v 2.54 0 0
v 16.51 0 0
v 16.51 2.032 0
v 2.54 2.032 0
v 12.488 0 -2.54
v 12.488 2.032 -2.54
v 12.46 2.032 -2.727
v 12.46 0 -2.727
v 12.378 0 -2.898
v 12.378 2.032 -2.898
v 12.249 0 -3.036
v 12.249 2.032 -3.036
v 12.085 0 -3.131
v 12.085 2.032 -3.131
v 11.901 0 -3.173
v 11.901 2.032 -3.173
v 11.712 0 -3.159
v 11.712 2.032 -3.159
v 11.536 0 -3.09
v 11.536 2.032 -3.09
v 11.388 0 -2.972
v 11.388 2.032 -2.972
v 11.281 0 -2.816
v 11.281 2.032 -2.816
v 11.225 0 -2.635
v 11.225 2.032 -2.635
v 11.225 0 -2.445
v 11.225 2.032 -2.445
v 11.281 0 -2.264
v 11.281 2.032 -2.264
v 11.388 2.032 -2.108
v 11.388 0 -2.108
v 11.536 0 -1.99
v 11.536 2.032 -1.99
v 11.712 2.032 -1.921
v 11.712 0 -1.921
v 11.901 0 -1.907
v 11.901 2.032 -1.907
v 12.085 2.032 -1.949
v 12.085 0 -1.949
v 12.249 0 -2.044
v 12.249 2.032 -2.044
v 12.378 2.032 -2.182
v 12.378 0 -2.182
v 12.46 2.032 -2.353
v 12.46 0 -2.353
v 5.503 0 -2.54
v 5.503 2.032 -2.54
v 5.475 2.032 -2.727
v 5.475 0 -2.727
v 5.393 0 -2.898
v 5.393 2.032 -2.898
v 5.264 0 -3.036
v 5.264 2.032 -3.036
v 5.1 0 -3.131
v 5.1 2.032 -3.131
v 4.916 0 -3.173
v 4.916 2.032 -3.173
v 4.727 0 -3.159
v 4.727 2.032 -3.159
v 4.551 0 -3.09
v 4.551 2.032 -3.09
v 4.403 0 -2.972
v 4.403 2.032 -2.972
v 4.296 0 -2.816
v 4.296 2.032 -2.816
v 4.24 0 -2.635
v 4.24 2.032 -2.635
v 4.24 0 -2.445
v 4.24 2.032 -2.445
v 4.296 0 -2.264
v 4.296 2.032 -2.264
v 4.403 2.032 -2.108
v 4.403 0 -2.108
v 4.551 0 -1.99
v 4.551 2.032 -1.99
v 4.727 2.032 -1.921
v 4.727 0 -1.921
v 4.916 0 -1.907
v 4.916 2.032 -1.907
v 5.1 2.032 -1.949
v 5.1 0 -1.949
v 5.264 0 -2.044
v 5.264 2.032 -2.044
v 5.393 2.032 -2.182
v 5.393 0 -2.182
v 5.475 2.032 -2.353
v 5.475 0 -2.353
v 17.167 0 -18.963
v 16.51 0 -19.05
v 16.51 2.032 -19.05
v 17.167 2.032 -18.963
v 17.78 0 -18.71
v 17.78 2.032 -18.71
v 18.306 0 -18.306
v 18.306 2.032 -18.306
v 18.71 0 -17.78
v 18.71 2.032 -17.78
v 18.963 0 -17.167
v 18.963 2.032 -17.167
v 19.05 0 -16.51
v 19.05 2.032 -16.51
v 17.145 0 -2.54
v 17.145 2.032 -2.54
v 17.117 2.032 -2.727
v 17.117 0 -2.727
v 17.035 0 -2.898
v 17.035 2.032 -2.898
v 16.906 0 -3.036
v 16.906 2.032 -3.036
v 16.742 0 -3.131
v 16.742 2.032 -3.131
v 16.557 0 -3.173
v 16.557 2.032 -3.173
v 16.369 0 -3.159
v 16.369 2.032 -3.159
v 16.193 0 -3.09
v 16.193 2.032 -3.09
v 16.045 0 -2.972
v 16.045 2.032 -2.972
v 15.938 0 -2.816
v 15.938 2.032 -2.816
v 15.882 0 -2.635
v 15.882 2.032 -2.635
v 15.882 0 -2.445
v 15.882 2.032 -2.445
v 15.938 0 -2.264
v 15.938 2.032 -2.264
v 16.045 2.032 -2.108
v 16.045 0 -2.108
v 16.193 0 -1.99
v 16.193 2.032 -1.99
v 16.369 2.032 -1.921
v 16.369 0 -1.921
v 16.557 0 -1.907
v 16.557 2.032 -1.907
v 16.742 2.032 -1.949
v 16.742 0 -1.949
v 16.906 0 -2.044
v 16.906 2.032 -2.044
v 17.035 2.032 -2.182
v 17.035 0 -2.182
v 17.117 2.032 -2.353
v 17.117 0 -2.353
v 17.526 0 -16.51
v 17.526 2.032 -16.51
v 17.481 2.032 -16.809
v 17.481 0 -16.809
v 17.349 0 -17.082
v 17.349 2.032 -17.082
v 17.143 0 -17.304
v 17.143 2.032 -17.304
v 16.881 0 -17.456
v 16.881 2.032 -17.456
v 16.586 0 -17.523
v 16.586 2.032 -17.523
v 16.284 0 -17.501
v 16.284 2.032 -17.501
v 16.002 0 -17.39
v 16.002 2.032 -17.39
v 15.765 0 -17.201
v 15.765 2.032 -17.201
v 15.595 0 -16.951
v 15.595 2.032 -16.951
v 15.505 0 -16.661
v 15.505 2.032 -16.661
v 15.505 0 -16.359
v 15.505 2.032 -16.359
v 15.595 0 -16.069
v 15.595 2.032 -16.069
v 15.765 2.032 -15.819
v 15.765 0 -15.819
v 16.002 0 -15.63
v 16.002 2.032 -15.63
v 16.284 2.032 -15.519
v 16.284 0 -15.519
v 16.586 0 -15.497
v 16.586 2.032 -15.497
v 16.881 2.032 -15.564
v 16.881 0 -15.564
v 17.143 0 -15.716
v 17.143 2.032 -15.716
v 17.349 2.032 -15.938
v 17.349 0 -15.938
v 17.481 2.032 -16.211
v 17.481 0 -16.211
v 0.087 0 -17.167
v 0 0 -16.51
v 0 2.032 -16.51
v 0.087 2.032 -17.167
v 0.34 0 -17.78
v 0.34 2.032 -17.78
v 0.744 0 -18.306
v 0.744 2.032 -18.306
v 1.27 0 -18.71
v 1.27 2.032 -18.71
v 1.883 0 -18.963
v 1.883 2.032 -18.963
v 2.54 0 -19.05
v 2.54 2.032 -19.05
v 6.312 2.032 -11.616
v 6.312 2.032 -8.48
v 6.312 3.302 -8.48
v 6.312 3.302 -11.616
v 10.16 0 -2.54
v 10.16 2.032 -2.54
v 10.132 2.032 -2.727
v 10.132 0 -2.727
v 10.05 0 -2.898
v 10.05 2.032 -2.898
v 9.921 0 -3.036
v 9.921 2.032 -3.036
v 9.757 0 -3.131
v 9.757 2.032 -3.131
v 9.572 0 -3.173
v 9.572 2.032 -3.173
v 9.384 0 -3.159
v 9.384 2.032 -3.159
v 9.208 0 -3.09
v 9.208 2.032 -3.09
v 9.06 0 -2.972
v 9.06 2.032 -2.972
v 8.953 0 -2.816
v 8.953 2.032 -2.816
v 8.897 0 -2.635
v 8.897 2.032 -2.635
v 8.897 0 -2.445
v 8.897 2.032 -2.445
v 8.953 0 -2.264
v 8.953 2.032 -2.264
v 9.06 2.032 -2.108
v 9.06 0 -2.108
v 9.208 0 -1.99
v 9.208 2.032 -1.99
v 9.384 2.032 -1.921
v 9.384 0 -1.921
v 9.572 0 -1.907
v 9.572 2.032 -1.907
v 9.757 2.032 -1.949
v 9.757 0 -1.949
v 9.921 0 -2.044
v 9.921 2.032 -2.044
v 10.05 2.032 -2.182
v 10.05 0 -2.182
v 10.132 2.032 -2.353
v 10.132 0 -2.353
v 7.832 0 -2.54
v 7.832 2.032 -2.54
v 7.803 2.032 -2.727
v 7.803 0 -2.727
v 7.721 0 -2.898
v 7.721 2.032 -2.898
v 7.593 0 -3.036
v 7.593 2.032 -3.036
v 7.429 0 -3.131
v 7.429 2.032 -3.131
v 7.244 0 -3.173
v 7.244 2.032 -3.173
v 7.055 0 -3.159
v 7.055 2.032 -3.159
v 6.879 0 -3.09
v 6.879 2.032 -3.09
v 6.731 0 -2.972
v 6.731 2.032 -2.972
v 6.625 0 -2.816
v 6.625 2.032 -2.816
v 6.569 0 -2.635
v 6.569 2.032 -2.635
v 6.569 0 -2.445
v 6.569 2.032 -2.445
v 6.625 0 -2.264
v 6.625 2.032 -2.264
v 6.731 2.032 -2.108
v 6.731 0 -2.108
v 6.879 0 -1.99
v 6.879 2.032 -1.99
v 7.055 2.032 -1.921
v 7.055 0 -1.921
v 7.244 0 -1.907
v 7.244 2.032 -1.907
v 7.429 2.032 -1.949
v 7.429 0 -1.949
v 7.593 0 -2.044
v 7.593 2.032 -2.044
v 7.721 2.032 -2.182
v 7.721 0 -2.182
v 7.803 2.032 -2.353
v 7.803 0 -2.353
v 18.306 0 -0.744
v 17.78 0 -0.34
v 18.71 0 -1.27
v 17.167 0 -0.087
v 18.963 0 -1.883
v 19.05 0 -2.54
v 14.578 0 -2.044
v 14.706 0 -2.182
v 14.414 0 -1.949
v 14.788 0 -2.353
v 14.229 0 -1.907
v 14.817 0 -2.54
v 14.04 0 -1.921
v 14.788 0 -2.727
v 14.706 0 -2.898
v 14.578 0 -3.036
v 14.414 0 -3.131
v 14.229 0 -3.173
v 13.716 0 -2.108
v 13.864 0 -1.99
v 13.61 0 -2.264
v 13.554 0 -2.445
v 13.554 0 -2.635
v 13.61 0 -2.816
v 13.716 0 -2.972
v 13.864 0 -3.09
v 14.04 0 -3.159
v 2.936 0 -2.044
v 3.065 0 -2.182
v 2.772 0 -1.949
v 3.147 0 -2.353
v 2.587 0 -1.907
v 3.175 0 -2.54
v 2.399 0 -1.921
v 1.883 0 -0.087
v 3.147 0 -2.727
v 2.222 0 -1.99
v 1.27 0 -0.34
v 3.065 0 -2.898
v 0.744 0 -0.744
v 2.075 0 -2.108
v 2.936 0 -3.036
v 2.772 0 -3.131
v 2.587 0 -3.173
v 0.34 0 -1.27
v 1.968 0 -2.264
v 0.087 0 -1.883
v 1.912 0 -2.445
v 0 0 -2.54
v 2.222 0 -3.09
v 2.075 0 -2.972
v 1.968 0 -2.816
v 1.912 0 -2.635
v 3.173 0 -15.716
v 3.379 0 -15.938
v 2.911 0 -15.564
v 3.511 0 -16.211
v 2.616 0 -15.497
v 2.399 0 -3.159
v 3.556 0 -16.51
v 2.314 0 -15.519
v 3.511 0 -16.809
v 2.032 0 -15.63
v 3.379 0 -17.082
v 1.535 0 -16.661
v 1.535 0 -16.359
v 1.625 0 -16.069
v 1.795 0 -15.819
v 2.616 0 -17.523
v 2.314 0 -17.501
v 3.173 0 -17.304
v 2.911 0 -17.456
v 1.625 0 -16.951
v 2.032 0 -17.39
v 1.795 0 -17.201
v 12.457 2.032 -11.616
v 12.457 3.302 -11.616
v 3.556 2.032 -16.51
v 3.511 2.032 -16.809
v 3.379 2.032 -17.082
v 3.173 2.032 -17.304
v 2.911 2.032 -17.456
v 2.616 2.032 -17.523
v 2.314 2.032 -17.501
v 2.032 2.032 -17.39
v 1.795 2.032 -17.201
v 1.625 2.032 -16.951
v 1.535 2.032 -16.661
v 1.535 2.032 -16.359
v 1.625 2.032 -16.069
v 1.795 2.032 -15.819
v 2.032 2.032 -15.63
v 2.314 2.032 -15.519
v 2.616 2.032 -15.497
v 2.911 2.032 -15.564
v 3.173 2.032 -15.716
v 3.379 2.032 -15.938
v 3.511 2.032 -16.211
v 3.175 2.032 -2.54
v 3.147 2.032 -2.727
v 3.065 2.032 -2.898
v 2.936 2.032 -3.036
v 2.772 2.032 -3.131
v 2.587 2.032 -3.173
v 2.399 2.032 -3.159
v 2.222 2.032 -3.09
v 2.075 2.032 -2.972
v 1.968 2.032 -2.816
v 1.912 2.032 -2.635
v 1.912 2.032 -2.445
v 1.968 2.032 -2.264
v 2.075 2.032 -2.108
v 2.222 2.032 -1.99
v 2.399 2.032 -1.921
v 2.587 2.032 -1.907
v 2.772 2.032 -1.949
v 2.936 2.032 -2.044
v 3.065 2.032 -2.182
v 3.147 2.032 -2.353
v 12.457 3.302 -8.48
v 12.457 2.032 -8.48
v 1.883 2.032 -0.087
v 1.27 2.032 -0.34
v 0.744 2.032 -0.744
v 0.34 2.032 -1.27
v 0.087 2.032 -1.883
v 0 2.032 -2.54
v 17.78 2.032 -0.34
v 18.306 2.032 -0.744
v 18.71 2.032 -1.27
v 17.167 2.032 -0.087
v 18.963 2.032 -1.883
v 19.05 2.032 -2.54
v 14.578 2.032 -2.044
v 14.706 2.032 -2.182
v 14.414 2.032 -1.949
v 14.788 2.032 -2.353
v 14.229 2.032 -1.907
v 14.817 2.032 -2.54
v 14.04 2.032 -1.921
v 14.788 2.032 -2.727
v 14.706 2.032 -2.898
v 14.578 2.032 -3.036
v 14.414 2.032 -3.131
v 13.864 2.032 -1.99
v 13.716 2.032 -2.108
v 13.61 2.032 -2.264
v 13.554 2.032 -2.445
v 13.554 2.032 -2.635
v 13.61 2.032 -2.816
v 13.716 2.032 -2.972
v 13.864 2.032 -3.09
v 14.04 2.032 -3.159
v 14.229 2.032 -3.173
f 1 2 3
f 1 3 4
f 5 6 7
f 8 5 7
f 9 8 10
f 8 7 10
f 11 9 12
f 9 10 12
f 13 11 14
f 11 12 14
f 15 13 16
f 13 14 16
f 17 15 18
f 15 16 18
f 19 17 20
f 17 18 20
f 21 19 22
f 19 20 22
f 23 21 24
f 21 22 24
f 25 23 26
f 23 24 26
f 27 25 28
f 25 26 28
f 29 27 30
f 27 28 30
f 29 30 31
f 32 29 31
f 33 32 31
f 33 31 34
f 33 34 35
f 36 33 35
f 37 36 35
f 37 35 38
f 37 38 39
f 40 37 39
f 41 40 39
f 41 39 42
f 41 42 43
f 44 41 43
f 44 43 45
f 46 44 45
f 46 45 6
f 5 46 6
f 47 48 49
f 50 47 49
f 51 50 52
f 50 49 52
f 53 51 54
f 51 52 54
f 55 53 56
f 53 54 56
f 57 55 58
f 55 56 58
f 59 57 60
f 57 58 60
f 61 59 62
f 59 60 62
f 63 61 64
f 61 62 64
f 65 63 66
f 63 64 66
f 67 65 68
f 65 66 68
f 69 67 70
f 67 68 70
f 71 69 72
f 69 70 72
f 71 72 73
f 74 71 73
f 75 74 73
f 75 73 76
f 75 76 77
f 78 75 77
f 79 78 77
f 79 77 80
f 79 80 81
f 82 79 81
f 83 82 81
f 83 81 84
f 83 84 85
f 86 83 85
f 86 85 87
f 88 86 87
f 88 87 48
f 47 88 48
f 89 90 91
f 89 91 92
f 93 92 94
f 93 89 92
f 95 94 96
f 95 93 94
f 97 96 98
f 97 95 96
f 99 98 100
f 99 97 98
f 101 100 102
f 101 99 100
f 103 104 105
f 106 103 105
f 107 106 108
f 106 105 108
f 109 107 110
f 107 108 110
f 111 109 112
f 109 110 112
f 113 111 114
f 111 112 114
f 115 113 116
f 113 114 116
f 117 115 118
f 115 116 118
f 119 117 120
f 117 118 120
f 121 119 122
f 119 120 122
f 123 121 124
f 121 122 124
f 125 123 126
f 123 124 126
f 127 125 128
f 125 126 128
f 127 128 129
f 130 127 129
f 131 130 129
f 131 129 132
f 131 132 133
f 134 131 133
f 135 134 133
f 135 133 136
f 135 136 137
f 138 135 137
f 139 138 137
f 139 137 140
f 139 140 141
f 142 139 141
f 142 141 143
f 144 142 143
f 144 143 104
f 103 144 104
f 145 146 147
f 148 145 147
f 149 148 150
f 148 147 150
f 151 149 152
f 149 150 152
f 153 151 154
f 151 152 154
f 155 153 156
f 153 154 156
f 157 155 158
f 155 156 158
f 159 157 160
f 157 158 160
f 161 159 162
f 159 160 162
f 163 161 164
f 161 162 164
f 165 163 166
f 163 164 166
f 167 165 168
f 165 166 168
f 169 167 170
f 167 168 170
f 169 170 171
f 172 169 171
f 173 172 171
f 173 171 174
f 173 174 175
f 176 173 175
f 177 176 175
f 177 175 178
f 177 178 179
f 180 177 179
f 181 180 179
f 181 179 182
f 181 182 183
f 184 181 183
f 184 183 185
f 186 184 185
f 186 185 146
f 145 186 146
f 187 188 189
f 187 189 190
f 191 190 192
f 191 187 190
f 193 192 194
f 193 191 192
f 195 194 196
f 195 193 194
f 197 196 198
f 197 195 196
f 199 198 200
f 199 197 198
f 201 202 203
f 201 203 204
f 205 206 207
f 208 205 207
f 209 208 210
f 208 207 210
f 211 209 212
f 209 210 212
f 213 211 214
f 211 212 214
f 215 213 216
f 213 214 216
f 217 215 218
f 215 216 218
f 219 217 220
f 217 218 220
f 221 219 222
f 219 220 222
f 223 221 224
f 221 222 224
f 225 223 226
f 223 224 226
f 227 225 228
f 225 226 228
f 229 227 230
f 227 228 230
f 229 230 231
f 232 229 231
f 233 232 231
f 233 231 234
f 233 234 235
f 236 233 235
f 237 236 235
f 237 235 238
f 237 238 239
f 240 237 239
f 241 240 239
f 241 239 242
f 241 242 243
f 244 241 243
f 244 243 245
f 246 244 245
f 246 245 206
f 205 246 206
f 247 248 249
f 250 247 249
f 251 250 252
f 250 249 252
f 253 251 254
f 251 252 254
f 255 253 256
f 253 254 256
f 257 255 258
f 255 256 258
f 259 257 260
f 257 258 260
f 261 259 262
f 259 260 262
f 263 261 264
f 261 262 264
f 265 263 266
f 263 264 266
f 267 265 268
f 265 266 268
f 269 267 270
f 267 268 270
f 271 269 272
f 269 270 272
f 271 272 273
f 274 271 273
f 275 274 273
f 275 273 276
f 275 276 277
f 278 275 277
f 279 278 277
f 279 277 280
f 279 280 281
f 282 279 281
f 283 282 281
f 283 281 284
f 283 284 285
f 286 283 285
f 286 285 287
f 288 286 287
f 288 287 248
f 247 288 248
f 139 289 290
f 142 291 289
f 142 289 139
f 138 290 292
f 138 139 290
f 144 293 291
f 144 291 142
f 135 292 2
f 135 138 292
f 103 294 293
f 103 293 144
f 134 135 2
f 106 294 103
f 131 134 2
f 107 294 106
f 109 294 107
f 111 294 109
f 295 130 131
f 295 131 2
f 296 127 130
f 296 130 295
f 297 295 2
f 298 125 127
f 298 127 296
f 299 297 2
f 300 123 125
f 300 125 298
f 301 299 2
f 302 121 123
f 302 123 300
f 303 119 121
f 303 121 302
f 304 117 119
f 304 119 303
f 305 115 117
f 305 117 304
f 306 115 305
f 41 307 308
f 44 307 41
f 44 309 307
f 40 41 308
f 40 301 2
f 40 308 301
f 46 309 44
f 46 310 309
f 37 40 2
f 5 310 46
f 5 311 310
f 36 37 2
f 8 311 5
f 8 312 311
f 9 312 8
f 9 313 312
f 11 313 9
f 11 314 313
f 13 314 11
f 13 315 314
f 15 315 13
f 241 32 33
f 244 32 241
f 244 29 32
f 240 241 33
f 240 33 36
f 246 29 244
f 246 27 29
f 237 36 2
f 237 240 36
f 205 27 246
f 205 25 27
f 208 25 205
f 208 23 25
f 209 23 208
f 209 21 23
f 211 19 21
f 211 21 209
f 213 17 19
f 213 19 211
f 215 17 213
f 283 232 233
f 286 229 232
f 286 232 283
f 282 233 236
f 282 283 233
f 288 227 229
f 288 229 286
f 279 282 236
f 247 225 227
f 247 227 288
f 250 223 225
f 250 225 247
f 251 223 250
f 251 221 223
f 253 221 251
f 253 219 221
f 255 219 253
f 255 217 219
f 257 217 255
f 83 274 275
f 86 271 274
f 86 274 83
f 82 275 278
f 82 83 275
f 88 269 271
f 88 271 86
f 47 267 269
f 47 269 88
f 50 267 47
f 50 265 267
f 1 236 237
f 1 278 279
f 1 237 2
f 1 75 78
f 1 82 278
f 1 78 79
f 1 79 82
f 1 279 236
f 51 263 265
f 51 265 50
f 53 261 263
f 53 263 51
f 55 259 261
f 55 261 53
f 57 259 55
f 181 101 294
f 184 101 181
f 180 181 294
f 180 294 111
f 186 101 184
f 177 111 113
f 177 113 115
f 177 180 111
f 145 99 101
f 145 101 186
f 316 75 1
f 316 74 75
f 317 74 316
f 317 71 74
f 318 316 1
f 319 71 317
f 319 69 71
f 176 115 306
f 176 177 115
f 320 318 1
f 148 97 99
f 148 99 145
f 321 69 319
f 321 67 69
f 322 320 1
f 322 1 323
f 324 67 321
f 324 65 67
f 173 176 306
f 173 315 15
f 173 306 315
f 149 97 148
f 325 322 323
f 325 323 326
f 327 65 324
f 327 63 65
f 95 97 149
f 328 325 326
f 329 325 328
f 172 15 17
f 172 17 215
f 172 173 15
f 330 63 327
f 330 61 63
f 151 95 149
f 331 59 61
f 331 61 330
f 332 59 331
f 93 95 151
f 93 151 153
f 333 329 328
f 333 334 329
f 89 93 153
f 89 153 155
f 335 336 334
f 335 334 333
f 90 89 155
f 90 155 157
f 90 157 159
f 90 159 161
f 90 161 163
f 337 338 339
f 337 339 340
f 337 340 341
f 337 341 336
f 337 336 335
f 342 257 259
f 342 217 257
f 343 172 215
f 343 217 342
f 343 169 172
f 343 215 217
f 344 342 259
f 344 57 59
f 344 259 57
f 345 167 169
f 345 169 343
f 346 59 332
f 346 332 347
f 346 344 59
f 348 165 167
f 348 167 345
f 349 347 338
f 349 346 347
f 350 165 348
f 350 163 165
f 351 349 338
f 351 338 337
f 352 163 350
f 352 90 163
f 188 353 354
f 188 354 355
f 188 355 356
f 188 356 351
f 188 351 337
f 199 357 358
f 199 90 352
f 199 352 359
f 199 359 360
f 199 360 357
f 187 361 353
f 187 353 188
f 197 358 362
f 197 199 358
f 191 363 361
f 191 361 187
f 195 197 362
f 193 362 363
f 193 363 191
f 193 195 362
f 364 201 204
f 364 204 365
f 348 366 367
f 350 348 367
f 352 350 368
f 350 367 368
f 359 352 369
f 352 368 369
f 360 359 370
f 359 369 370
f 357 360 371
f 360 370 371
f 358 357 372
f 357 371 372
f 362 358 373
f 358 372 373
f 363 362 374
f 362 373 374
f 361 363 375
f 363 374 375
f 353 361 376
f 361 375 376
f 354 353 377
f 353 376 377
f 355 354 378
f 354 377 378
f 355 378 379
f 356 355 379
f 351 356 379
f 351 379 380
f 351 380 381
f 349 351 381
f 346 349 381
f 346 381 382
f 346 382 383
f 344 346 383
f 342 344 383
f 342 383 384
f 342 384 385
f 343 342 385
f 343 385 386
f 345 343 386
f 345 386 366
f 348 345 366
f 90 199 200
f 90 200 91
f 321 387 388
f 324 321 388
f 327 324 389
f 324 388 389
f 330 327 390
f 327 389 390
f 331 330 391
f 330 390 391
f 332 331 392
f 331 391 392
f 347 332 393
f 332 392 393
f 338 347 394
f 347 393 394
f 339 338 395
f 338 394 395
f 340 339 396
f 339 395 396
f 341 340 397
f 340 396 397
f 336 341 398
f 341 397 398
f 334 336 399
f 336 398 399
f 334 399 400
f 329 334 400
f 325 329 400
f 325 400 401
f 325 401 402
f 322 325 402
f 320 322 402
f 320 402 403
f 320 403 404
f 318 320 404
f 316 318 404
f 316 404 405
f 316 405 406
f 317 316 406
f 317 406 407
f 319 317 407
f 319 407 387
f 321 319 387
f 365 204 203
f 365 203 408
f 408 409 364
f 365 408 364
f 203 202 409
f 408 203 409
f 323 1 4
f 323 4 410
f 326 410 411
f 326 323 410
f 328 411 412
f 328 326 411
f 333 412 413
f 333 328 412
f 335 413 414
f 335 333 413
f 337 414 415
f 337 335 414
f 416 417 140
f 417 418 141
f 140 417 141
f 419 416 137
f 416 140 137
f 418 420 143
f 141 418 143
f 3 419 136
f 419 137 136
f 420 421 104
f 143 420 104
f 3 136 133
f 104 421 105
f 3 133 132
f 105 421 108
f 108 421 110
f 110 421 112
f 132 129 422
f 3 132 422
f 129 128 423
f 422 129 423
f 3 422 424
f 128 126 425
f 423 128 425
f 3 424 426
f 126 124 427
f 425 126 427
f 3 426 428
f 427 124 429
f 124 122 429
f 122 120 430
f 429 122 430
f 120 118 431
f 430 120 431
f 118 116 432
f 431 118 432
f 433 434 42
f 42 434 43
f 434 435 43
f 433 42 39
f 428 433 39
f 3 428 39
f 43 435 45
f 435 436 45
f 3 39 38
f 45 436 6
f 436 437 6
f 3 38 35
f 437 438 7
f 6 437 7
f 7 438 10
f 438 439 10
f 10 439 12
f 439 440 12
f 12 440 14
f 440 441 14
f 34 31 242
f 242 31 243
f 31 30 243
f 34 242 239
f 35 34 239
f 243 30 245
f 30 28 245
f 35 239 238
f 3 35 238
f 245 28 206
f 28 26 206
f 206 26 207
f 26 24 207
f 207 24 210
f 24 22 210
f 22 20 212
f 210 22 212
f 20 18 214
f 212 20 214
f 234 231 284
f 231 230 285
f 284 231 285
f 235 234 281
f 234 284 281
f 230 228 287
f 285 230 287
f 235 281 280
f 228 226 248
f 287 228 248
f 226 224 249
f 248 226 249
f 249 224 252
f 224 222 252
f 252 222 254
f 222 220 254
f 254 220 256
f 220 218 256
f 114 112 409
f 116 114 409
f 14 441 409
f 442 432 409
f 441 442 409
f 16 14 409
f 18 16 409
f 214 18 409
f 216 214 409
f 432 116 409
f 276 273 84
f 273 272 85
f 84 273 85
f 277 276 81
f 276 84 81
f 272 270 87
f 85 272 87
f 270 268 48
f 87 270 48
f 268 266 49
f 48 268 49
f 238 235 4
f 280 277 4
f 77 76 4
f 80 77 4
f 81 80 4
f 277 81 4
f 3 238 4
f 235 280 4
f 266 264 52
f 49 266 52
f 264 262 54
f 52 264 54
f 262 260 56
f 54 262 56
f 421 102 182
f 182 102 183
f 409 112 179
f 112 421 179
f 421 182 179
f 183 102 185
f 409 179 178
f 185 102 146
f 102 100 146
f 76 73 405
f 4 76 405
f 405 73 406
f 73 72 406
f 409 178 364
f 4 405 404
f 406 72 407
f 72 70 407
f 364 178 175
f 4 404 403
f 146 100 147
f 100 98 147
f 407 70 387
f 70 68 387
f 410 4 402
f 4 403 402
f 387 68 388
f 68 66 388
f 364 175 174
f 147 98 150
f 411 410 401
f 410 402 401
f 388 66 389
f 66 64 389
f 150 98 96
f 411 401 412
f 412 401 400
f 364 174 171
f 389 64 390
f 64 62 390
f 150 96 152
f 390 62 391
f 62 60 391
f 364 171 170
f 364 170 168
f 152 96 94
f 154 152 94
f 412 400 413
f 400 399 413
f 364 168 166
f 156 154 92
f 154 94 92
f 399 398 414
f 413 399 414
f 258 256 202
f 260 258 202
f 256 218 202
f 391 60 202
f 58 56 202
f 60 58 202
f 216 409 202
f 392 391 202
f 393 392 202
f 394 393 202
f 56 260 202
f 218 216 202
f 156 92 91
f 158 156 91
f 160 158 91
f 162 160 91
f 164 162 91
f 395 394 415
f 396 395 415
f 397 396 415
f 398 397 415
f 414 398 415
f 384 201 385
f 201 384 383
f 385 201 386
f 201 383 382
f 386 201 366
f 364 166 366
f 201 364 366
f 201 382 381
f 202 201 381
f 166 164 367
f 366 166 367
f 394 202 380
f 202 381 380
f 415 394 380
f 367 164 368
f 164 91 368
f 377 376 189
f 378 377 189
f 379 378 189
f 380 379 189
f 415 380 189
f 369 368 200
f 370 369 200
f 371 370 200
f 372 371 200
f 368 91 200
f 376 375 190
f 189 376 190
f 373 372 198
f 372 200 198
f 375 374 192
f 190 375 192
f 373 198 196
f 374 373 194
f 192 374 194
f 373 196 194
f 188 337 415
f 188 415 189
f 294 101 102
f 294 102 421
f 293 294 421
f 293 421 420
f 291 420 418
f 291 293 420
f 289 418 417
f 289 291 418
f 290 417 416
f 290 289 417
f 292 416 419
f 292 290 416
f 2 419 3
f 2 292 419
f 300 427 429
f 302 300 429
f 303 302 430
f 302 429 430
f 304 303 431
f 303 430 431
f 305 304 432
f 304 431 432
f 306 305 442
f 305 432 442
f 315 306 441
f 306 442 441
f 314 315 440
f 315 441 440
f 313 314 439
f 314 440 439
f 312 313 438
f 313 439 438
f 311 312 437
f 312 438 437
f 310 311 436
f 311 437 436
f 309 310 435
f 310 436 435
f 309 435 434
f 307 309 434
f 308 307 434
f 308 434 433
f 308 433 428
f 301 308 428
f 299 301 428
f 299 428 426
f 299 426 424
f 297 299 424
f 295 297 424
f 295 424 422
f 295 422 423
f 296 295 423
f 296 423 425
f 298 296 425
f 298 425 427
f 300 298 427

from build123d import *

# Parameters (mm, degrees)
BOSS_EXTRUDE1_DEPTH = 2.032
SKETCH2_R           = 1.016
SKETCH2_R_2         = 0.635
CUT_EXTRUDE1_DEPTH  = 3.032
SKETCH3_W           = 6.145312949
SKETCH3_H           = 3.136404534
BOSS_EXTRUDE2_DEPTH = 1.27


with BuildPart() as part:
    # Sketch1 → Boss-Extrude1 (new body)
    with BuildSketch(Plane(origin=(0, 0, 0), x_dir=(1, 0, 0), z_dir=(0, 1, 0))):
        with BuildLine():
            Line((0, 2.54), (0, 16.51))
            ThreePointArc((0, 16.51), (0.743948776, 18.306051224), (2.54, 19.05))
            Line((2.54, 19.05), (16.51, 19.05))
            ThreePointArc((16.51, 19.05), (18.306051224, 18.306051224), (19.05, 16.51))
            Line((19.05, 16.51), (19.05, 2.54))
            ThreePointArc((19.05, 2.54), (18.306051224, 0.743948776), (16.51, 0))
            Line((16.51, 0), (2.54, 0))
            ThreePointArc((2.54, 0), (0.743948776, 0.743948776), (0, 2.54))
        make_face()
    extrude(amount=BOSS_EXTRUDE1_DEPTH)

    # Sketch2 → Cut-Extrude1 (cut, through all)
    with BuildSketch(Plane(origin=(0, 2.032, 0), x_dir=(1, 0, 0), z_dir=(0, 1, 0))):
        with Locations((2.54, 16.51)):
            Circle(SKETCH2_R)
        with Locations((16.51, 16.51)):
            Circle(SKETCH2_R)
        with Locations((2.54, 2.54)):
            Circle(SKETCH2_R_2)
        with Locations((4.868333333, 2.54)):
            Circle(SKETCH2_R_2)
        with Locations((7.196666667, 2.54)):
            Circle(SKETCH2_R_2)
        with Locations((9.525, 2.54)):
            Circle(SKETCH2_R_2)
        with Locations((11.853333333, 2.54)):
            Circle(SKETCH2_R_2)
        with Locations((14.181666667, 2.54)):
            Circle(SKETCH2_R_2)
        with Locations((16.51, 2.54)):
            Circle(SKETCH2_R_2)
    extrude(amount=-CUT_EXTRUDE1_DEPTH, mode=Mode.SUBTRACT)

    # Sketch3 → Boss-Extrude2 (add)
    with BuildSketch(Plane(origin=(0, 2.032, 0), x_dir=(1, 0, 0), z_dir=(0, 1, 0))):
        with Locations((9.384754269, 10.047734089)):
            Rectangle(SKETCH3_W, SKETCH3_H)
    extrude(amount=BOSS_EXTRUDE2_DEPTH)


solid = part.part
